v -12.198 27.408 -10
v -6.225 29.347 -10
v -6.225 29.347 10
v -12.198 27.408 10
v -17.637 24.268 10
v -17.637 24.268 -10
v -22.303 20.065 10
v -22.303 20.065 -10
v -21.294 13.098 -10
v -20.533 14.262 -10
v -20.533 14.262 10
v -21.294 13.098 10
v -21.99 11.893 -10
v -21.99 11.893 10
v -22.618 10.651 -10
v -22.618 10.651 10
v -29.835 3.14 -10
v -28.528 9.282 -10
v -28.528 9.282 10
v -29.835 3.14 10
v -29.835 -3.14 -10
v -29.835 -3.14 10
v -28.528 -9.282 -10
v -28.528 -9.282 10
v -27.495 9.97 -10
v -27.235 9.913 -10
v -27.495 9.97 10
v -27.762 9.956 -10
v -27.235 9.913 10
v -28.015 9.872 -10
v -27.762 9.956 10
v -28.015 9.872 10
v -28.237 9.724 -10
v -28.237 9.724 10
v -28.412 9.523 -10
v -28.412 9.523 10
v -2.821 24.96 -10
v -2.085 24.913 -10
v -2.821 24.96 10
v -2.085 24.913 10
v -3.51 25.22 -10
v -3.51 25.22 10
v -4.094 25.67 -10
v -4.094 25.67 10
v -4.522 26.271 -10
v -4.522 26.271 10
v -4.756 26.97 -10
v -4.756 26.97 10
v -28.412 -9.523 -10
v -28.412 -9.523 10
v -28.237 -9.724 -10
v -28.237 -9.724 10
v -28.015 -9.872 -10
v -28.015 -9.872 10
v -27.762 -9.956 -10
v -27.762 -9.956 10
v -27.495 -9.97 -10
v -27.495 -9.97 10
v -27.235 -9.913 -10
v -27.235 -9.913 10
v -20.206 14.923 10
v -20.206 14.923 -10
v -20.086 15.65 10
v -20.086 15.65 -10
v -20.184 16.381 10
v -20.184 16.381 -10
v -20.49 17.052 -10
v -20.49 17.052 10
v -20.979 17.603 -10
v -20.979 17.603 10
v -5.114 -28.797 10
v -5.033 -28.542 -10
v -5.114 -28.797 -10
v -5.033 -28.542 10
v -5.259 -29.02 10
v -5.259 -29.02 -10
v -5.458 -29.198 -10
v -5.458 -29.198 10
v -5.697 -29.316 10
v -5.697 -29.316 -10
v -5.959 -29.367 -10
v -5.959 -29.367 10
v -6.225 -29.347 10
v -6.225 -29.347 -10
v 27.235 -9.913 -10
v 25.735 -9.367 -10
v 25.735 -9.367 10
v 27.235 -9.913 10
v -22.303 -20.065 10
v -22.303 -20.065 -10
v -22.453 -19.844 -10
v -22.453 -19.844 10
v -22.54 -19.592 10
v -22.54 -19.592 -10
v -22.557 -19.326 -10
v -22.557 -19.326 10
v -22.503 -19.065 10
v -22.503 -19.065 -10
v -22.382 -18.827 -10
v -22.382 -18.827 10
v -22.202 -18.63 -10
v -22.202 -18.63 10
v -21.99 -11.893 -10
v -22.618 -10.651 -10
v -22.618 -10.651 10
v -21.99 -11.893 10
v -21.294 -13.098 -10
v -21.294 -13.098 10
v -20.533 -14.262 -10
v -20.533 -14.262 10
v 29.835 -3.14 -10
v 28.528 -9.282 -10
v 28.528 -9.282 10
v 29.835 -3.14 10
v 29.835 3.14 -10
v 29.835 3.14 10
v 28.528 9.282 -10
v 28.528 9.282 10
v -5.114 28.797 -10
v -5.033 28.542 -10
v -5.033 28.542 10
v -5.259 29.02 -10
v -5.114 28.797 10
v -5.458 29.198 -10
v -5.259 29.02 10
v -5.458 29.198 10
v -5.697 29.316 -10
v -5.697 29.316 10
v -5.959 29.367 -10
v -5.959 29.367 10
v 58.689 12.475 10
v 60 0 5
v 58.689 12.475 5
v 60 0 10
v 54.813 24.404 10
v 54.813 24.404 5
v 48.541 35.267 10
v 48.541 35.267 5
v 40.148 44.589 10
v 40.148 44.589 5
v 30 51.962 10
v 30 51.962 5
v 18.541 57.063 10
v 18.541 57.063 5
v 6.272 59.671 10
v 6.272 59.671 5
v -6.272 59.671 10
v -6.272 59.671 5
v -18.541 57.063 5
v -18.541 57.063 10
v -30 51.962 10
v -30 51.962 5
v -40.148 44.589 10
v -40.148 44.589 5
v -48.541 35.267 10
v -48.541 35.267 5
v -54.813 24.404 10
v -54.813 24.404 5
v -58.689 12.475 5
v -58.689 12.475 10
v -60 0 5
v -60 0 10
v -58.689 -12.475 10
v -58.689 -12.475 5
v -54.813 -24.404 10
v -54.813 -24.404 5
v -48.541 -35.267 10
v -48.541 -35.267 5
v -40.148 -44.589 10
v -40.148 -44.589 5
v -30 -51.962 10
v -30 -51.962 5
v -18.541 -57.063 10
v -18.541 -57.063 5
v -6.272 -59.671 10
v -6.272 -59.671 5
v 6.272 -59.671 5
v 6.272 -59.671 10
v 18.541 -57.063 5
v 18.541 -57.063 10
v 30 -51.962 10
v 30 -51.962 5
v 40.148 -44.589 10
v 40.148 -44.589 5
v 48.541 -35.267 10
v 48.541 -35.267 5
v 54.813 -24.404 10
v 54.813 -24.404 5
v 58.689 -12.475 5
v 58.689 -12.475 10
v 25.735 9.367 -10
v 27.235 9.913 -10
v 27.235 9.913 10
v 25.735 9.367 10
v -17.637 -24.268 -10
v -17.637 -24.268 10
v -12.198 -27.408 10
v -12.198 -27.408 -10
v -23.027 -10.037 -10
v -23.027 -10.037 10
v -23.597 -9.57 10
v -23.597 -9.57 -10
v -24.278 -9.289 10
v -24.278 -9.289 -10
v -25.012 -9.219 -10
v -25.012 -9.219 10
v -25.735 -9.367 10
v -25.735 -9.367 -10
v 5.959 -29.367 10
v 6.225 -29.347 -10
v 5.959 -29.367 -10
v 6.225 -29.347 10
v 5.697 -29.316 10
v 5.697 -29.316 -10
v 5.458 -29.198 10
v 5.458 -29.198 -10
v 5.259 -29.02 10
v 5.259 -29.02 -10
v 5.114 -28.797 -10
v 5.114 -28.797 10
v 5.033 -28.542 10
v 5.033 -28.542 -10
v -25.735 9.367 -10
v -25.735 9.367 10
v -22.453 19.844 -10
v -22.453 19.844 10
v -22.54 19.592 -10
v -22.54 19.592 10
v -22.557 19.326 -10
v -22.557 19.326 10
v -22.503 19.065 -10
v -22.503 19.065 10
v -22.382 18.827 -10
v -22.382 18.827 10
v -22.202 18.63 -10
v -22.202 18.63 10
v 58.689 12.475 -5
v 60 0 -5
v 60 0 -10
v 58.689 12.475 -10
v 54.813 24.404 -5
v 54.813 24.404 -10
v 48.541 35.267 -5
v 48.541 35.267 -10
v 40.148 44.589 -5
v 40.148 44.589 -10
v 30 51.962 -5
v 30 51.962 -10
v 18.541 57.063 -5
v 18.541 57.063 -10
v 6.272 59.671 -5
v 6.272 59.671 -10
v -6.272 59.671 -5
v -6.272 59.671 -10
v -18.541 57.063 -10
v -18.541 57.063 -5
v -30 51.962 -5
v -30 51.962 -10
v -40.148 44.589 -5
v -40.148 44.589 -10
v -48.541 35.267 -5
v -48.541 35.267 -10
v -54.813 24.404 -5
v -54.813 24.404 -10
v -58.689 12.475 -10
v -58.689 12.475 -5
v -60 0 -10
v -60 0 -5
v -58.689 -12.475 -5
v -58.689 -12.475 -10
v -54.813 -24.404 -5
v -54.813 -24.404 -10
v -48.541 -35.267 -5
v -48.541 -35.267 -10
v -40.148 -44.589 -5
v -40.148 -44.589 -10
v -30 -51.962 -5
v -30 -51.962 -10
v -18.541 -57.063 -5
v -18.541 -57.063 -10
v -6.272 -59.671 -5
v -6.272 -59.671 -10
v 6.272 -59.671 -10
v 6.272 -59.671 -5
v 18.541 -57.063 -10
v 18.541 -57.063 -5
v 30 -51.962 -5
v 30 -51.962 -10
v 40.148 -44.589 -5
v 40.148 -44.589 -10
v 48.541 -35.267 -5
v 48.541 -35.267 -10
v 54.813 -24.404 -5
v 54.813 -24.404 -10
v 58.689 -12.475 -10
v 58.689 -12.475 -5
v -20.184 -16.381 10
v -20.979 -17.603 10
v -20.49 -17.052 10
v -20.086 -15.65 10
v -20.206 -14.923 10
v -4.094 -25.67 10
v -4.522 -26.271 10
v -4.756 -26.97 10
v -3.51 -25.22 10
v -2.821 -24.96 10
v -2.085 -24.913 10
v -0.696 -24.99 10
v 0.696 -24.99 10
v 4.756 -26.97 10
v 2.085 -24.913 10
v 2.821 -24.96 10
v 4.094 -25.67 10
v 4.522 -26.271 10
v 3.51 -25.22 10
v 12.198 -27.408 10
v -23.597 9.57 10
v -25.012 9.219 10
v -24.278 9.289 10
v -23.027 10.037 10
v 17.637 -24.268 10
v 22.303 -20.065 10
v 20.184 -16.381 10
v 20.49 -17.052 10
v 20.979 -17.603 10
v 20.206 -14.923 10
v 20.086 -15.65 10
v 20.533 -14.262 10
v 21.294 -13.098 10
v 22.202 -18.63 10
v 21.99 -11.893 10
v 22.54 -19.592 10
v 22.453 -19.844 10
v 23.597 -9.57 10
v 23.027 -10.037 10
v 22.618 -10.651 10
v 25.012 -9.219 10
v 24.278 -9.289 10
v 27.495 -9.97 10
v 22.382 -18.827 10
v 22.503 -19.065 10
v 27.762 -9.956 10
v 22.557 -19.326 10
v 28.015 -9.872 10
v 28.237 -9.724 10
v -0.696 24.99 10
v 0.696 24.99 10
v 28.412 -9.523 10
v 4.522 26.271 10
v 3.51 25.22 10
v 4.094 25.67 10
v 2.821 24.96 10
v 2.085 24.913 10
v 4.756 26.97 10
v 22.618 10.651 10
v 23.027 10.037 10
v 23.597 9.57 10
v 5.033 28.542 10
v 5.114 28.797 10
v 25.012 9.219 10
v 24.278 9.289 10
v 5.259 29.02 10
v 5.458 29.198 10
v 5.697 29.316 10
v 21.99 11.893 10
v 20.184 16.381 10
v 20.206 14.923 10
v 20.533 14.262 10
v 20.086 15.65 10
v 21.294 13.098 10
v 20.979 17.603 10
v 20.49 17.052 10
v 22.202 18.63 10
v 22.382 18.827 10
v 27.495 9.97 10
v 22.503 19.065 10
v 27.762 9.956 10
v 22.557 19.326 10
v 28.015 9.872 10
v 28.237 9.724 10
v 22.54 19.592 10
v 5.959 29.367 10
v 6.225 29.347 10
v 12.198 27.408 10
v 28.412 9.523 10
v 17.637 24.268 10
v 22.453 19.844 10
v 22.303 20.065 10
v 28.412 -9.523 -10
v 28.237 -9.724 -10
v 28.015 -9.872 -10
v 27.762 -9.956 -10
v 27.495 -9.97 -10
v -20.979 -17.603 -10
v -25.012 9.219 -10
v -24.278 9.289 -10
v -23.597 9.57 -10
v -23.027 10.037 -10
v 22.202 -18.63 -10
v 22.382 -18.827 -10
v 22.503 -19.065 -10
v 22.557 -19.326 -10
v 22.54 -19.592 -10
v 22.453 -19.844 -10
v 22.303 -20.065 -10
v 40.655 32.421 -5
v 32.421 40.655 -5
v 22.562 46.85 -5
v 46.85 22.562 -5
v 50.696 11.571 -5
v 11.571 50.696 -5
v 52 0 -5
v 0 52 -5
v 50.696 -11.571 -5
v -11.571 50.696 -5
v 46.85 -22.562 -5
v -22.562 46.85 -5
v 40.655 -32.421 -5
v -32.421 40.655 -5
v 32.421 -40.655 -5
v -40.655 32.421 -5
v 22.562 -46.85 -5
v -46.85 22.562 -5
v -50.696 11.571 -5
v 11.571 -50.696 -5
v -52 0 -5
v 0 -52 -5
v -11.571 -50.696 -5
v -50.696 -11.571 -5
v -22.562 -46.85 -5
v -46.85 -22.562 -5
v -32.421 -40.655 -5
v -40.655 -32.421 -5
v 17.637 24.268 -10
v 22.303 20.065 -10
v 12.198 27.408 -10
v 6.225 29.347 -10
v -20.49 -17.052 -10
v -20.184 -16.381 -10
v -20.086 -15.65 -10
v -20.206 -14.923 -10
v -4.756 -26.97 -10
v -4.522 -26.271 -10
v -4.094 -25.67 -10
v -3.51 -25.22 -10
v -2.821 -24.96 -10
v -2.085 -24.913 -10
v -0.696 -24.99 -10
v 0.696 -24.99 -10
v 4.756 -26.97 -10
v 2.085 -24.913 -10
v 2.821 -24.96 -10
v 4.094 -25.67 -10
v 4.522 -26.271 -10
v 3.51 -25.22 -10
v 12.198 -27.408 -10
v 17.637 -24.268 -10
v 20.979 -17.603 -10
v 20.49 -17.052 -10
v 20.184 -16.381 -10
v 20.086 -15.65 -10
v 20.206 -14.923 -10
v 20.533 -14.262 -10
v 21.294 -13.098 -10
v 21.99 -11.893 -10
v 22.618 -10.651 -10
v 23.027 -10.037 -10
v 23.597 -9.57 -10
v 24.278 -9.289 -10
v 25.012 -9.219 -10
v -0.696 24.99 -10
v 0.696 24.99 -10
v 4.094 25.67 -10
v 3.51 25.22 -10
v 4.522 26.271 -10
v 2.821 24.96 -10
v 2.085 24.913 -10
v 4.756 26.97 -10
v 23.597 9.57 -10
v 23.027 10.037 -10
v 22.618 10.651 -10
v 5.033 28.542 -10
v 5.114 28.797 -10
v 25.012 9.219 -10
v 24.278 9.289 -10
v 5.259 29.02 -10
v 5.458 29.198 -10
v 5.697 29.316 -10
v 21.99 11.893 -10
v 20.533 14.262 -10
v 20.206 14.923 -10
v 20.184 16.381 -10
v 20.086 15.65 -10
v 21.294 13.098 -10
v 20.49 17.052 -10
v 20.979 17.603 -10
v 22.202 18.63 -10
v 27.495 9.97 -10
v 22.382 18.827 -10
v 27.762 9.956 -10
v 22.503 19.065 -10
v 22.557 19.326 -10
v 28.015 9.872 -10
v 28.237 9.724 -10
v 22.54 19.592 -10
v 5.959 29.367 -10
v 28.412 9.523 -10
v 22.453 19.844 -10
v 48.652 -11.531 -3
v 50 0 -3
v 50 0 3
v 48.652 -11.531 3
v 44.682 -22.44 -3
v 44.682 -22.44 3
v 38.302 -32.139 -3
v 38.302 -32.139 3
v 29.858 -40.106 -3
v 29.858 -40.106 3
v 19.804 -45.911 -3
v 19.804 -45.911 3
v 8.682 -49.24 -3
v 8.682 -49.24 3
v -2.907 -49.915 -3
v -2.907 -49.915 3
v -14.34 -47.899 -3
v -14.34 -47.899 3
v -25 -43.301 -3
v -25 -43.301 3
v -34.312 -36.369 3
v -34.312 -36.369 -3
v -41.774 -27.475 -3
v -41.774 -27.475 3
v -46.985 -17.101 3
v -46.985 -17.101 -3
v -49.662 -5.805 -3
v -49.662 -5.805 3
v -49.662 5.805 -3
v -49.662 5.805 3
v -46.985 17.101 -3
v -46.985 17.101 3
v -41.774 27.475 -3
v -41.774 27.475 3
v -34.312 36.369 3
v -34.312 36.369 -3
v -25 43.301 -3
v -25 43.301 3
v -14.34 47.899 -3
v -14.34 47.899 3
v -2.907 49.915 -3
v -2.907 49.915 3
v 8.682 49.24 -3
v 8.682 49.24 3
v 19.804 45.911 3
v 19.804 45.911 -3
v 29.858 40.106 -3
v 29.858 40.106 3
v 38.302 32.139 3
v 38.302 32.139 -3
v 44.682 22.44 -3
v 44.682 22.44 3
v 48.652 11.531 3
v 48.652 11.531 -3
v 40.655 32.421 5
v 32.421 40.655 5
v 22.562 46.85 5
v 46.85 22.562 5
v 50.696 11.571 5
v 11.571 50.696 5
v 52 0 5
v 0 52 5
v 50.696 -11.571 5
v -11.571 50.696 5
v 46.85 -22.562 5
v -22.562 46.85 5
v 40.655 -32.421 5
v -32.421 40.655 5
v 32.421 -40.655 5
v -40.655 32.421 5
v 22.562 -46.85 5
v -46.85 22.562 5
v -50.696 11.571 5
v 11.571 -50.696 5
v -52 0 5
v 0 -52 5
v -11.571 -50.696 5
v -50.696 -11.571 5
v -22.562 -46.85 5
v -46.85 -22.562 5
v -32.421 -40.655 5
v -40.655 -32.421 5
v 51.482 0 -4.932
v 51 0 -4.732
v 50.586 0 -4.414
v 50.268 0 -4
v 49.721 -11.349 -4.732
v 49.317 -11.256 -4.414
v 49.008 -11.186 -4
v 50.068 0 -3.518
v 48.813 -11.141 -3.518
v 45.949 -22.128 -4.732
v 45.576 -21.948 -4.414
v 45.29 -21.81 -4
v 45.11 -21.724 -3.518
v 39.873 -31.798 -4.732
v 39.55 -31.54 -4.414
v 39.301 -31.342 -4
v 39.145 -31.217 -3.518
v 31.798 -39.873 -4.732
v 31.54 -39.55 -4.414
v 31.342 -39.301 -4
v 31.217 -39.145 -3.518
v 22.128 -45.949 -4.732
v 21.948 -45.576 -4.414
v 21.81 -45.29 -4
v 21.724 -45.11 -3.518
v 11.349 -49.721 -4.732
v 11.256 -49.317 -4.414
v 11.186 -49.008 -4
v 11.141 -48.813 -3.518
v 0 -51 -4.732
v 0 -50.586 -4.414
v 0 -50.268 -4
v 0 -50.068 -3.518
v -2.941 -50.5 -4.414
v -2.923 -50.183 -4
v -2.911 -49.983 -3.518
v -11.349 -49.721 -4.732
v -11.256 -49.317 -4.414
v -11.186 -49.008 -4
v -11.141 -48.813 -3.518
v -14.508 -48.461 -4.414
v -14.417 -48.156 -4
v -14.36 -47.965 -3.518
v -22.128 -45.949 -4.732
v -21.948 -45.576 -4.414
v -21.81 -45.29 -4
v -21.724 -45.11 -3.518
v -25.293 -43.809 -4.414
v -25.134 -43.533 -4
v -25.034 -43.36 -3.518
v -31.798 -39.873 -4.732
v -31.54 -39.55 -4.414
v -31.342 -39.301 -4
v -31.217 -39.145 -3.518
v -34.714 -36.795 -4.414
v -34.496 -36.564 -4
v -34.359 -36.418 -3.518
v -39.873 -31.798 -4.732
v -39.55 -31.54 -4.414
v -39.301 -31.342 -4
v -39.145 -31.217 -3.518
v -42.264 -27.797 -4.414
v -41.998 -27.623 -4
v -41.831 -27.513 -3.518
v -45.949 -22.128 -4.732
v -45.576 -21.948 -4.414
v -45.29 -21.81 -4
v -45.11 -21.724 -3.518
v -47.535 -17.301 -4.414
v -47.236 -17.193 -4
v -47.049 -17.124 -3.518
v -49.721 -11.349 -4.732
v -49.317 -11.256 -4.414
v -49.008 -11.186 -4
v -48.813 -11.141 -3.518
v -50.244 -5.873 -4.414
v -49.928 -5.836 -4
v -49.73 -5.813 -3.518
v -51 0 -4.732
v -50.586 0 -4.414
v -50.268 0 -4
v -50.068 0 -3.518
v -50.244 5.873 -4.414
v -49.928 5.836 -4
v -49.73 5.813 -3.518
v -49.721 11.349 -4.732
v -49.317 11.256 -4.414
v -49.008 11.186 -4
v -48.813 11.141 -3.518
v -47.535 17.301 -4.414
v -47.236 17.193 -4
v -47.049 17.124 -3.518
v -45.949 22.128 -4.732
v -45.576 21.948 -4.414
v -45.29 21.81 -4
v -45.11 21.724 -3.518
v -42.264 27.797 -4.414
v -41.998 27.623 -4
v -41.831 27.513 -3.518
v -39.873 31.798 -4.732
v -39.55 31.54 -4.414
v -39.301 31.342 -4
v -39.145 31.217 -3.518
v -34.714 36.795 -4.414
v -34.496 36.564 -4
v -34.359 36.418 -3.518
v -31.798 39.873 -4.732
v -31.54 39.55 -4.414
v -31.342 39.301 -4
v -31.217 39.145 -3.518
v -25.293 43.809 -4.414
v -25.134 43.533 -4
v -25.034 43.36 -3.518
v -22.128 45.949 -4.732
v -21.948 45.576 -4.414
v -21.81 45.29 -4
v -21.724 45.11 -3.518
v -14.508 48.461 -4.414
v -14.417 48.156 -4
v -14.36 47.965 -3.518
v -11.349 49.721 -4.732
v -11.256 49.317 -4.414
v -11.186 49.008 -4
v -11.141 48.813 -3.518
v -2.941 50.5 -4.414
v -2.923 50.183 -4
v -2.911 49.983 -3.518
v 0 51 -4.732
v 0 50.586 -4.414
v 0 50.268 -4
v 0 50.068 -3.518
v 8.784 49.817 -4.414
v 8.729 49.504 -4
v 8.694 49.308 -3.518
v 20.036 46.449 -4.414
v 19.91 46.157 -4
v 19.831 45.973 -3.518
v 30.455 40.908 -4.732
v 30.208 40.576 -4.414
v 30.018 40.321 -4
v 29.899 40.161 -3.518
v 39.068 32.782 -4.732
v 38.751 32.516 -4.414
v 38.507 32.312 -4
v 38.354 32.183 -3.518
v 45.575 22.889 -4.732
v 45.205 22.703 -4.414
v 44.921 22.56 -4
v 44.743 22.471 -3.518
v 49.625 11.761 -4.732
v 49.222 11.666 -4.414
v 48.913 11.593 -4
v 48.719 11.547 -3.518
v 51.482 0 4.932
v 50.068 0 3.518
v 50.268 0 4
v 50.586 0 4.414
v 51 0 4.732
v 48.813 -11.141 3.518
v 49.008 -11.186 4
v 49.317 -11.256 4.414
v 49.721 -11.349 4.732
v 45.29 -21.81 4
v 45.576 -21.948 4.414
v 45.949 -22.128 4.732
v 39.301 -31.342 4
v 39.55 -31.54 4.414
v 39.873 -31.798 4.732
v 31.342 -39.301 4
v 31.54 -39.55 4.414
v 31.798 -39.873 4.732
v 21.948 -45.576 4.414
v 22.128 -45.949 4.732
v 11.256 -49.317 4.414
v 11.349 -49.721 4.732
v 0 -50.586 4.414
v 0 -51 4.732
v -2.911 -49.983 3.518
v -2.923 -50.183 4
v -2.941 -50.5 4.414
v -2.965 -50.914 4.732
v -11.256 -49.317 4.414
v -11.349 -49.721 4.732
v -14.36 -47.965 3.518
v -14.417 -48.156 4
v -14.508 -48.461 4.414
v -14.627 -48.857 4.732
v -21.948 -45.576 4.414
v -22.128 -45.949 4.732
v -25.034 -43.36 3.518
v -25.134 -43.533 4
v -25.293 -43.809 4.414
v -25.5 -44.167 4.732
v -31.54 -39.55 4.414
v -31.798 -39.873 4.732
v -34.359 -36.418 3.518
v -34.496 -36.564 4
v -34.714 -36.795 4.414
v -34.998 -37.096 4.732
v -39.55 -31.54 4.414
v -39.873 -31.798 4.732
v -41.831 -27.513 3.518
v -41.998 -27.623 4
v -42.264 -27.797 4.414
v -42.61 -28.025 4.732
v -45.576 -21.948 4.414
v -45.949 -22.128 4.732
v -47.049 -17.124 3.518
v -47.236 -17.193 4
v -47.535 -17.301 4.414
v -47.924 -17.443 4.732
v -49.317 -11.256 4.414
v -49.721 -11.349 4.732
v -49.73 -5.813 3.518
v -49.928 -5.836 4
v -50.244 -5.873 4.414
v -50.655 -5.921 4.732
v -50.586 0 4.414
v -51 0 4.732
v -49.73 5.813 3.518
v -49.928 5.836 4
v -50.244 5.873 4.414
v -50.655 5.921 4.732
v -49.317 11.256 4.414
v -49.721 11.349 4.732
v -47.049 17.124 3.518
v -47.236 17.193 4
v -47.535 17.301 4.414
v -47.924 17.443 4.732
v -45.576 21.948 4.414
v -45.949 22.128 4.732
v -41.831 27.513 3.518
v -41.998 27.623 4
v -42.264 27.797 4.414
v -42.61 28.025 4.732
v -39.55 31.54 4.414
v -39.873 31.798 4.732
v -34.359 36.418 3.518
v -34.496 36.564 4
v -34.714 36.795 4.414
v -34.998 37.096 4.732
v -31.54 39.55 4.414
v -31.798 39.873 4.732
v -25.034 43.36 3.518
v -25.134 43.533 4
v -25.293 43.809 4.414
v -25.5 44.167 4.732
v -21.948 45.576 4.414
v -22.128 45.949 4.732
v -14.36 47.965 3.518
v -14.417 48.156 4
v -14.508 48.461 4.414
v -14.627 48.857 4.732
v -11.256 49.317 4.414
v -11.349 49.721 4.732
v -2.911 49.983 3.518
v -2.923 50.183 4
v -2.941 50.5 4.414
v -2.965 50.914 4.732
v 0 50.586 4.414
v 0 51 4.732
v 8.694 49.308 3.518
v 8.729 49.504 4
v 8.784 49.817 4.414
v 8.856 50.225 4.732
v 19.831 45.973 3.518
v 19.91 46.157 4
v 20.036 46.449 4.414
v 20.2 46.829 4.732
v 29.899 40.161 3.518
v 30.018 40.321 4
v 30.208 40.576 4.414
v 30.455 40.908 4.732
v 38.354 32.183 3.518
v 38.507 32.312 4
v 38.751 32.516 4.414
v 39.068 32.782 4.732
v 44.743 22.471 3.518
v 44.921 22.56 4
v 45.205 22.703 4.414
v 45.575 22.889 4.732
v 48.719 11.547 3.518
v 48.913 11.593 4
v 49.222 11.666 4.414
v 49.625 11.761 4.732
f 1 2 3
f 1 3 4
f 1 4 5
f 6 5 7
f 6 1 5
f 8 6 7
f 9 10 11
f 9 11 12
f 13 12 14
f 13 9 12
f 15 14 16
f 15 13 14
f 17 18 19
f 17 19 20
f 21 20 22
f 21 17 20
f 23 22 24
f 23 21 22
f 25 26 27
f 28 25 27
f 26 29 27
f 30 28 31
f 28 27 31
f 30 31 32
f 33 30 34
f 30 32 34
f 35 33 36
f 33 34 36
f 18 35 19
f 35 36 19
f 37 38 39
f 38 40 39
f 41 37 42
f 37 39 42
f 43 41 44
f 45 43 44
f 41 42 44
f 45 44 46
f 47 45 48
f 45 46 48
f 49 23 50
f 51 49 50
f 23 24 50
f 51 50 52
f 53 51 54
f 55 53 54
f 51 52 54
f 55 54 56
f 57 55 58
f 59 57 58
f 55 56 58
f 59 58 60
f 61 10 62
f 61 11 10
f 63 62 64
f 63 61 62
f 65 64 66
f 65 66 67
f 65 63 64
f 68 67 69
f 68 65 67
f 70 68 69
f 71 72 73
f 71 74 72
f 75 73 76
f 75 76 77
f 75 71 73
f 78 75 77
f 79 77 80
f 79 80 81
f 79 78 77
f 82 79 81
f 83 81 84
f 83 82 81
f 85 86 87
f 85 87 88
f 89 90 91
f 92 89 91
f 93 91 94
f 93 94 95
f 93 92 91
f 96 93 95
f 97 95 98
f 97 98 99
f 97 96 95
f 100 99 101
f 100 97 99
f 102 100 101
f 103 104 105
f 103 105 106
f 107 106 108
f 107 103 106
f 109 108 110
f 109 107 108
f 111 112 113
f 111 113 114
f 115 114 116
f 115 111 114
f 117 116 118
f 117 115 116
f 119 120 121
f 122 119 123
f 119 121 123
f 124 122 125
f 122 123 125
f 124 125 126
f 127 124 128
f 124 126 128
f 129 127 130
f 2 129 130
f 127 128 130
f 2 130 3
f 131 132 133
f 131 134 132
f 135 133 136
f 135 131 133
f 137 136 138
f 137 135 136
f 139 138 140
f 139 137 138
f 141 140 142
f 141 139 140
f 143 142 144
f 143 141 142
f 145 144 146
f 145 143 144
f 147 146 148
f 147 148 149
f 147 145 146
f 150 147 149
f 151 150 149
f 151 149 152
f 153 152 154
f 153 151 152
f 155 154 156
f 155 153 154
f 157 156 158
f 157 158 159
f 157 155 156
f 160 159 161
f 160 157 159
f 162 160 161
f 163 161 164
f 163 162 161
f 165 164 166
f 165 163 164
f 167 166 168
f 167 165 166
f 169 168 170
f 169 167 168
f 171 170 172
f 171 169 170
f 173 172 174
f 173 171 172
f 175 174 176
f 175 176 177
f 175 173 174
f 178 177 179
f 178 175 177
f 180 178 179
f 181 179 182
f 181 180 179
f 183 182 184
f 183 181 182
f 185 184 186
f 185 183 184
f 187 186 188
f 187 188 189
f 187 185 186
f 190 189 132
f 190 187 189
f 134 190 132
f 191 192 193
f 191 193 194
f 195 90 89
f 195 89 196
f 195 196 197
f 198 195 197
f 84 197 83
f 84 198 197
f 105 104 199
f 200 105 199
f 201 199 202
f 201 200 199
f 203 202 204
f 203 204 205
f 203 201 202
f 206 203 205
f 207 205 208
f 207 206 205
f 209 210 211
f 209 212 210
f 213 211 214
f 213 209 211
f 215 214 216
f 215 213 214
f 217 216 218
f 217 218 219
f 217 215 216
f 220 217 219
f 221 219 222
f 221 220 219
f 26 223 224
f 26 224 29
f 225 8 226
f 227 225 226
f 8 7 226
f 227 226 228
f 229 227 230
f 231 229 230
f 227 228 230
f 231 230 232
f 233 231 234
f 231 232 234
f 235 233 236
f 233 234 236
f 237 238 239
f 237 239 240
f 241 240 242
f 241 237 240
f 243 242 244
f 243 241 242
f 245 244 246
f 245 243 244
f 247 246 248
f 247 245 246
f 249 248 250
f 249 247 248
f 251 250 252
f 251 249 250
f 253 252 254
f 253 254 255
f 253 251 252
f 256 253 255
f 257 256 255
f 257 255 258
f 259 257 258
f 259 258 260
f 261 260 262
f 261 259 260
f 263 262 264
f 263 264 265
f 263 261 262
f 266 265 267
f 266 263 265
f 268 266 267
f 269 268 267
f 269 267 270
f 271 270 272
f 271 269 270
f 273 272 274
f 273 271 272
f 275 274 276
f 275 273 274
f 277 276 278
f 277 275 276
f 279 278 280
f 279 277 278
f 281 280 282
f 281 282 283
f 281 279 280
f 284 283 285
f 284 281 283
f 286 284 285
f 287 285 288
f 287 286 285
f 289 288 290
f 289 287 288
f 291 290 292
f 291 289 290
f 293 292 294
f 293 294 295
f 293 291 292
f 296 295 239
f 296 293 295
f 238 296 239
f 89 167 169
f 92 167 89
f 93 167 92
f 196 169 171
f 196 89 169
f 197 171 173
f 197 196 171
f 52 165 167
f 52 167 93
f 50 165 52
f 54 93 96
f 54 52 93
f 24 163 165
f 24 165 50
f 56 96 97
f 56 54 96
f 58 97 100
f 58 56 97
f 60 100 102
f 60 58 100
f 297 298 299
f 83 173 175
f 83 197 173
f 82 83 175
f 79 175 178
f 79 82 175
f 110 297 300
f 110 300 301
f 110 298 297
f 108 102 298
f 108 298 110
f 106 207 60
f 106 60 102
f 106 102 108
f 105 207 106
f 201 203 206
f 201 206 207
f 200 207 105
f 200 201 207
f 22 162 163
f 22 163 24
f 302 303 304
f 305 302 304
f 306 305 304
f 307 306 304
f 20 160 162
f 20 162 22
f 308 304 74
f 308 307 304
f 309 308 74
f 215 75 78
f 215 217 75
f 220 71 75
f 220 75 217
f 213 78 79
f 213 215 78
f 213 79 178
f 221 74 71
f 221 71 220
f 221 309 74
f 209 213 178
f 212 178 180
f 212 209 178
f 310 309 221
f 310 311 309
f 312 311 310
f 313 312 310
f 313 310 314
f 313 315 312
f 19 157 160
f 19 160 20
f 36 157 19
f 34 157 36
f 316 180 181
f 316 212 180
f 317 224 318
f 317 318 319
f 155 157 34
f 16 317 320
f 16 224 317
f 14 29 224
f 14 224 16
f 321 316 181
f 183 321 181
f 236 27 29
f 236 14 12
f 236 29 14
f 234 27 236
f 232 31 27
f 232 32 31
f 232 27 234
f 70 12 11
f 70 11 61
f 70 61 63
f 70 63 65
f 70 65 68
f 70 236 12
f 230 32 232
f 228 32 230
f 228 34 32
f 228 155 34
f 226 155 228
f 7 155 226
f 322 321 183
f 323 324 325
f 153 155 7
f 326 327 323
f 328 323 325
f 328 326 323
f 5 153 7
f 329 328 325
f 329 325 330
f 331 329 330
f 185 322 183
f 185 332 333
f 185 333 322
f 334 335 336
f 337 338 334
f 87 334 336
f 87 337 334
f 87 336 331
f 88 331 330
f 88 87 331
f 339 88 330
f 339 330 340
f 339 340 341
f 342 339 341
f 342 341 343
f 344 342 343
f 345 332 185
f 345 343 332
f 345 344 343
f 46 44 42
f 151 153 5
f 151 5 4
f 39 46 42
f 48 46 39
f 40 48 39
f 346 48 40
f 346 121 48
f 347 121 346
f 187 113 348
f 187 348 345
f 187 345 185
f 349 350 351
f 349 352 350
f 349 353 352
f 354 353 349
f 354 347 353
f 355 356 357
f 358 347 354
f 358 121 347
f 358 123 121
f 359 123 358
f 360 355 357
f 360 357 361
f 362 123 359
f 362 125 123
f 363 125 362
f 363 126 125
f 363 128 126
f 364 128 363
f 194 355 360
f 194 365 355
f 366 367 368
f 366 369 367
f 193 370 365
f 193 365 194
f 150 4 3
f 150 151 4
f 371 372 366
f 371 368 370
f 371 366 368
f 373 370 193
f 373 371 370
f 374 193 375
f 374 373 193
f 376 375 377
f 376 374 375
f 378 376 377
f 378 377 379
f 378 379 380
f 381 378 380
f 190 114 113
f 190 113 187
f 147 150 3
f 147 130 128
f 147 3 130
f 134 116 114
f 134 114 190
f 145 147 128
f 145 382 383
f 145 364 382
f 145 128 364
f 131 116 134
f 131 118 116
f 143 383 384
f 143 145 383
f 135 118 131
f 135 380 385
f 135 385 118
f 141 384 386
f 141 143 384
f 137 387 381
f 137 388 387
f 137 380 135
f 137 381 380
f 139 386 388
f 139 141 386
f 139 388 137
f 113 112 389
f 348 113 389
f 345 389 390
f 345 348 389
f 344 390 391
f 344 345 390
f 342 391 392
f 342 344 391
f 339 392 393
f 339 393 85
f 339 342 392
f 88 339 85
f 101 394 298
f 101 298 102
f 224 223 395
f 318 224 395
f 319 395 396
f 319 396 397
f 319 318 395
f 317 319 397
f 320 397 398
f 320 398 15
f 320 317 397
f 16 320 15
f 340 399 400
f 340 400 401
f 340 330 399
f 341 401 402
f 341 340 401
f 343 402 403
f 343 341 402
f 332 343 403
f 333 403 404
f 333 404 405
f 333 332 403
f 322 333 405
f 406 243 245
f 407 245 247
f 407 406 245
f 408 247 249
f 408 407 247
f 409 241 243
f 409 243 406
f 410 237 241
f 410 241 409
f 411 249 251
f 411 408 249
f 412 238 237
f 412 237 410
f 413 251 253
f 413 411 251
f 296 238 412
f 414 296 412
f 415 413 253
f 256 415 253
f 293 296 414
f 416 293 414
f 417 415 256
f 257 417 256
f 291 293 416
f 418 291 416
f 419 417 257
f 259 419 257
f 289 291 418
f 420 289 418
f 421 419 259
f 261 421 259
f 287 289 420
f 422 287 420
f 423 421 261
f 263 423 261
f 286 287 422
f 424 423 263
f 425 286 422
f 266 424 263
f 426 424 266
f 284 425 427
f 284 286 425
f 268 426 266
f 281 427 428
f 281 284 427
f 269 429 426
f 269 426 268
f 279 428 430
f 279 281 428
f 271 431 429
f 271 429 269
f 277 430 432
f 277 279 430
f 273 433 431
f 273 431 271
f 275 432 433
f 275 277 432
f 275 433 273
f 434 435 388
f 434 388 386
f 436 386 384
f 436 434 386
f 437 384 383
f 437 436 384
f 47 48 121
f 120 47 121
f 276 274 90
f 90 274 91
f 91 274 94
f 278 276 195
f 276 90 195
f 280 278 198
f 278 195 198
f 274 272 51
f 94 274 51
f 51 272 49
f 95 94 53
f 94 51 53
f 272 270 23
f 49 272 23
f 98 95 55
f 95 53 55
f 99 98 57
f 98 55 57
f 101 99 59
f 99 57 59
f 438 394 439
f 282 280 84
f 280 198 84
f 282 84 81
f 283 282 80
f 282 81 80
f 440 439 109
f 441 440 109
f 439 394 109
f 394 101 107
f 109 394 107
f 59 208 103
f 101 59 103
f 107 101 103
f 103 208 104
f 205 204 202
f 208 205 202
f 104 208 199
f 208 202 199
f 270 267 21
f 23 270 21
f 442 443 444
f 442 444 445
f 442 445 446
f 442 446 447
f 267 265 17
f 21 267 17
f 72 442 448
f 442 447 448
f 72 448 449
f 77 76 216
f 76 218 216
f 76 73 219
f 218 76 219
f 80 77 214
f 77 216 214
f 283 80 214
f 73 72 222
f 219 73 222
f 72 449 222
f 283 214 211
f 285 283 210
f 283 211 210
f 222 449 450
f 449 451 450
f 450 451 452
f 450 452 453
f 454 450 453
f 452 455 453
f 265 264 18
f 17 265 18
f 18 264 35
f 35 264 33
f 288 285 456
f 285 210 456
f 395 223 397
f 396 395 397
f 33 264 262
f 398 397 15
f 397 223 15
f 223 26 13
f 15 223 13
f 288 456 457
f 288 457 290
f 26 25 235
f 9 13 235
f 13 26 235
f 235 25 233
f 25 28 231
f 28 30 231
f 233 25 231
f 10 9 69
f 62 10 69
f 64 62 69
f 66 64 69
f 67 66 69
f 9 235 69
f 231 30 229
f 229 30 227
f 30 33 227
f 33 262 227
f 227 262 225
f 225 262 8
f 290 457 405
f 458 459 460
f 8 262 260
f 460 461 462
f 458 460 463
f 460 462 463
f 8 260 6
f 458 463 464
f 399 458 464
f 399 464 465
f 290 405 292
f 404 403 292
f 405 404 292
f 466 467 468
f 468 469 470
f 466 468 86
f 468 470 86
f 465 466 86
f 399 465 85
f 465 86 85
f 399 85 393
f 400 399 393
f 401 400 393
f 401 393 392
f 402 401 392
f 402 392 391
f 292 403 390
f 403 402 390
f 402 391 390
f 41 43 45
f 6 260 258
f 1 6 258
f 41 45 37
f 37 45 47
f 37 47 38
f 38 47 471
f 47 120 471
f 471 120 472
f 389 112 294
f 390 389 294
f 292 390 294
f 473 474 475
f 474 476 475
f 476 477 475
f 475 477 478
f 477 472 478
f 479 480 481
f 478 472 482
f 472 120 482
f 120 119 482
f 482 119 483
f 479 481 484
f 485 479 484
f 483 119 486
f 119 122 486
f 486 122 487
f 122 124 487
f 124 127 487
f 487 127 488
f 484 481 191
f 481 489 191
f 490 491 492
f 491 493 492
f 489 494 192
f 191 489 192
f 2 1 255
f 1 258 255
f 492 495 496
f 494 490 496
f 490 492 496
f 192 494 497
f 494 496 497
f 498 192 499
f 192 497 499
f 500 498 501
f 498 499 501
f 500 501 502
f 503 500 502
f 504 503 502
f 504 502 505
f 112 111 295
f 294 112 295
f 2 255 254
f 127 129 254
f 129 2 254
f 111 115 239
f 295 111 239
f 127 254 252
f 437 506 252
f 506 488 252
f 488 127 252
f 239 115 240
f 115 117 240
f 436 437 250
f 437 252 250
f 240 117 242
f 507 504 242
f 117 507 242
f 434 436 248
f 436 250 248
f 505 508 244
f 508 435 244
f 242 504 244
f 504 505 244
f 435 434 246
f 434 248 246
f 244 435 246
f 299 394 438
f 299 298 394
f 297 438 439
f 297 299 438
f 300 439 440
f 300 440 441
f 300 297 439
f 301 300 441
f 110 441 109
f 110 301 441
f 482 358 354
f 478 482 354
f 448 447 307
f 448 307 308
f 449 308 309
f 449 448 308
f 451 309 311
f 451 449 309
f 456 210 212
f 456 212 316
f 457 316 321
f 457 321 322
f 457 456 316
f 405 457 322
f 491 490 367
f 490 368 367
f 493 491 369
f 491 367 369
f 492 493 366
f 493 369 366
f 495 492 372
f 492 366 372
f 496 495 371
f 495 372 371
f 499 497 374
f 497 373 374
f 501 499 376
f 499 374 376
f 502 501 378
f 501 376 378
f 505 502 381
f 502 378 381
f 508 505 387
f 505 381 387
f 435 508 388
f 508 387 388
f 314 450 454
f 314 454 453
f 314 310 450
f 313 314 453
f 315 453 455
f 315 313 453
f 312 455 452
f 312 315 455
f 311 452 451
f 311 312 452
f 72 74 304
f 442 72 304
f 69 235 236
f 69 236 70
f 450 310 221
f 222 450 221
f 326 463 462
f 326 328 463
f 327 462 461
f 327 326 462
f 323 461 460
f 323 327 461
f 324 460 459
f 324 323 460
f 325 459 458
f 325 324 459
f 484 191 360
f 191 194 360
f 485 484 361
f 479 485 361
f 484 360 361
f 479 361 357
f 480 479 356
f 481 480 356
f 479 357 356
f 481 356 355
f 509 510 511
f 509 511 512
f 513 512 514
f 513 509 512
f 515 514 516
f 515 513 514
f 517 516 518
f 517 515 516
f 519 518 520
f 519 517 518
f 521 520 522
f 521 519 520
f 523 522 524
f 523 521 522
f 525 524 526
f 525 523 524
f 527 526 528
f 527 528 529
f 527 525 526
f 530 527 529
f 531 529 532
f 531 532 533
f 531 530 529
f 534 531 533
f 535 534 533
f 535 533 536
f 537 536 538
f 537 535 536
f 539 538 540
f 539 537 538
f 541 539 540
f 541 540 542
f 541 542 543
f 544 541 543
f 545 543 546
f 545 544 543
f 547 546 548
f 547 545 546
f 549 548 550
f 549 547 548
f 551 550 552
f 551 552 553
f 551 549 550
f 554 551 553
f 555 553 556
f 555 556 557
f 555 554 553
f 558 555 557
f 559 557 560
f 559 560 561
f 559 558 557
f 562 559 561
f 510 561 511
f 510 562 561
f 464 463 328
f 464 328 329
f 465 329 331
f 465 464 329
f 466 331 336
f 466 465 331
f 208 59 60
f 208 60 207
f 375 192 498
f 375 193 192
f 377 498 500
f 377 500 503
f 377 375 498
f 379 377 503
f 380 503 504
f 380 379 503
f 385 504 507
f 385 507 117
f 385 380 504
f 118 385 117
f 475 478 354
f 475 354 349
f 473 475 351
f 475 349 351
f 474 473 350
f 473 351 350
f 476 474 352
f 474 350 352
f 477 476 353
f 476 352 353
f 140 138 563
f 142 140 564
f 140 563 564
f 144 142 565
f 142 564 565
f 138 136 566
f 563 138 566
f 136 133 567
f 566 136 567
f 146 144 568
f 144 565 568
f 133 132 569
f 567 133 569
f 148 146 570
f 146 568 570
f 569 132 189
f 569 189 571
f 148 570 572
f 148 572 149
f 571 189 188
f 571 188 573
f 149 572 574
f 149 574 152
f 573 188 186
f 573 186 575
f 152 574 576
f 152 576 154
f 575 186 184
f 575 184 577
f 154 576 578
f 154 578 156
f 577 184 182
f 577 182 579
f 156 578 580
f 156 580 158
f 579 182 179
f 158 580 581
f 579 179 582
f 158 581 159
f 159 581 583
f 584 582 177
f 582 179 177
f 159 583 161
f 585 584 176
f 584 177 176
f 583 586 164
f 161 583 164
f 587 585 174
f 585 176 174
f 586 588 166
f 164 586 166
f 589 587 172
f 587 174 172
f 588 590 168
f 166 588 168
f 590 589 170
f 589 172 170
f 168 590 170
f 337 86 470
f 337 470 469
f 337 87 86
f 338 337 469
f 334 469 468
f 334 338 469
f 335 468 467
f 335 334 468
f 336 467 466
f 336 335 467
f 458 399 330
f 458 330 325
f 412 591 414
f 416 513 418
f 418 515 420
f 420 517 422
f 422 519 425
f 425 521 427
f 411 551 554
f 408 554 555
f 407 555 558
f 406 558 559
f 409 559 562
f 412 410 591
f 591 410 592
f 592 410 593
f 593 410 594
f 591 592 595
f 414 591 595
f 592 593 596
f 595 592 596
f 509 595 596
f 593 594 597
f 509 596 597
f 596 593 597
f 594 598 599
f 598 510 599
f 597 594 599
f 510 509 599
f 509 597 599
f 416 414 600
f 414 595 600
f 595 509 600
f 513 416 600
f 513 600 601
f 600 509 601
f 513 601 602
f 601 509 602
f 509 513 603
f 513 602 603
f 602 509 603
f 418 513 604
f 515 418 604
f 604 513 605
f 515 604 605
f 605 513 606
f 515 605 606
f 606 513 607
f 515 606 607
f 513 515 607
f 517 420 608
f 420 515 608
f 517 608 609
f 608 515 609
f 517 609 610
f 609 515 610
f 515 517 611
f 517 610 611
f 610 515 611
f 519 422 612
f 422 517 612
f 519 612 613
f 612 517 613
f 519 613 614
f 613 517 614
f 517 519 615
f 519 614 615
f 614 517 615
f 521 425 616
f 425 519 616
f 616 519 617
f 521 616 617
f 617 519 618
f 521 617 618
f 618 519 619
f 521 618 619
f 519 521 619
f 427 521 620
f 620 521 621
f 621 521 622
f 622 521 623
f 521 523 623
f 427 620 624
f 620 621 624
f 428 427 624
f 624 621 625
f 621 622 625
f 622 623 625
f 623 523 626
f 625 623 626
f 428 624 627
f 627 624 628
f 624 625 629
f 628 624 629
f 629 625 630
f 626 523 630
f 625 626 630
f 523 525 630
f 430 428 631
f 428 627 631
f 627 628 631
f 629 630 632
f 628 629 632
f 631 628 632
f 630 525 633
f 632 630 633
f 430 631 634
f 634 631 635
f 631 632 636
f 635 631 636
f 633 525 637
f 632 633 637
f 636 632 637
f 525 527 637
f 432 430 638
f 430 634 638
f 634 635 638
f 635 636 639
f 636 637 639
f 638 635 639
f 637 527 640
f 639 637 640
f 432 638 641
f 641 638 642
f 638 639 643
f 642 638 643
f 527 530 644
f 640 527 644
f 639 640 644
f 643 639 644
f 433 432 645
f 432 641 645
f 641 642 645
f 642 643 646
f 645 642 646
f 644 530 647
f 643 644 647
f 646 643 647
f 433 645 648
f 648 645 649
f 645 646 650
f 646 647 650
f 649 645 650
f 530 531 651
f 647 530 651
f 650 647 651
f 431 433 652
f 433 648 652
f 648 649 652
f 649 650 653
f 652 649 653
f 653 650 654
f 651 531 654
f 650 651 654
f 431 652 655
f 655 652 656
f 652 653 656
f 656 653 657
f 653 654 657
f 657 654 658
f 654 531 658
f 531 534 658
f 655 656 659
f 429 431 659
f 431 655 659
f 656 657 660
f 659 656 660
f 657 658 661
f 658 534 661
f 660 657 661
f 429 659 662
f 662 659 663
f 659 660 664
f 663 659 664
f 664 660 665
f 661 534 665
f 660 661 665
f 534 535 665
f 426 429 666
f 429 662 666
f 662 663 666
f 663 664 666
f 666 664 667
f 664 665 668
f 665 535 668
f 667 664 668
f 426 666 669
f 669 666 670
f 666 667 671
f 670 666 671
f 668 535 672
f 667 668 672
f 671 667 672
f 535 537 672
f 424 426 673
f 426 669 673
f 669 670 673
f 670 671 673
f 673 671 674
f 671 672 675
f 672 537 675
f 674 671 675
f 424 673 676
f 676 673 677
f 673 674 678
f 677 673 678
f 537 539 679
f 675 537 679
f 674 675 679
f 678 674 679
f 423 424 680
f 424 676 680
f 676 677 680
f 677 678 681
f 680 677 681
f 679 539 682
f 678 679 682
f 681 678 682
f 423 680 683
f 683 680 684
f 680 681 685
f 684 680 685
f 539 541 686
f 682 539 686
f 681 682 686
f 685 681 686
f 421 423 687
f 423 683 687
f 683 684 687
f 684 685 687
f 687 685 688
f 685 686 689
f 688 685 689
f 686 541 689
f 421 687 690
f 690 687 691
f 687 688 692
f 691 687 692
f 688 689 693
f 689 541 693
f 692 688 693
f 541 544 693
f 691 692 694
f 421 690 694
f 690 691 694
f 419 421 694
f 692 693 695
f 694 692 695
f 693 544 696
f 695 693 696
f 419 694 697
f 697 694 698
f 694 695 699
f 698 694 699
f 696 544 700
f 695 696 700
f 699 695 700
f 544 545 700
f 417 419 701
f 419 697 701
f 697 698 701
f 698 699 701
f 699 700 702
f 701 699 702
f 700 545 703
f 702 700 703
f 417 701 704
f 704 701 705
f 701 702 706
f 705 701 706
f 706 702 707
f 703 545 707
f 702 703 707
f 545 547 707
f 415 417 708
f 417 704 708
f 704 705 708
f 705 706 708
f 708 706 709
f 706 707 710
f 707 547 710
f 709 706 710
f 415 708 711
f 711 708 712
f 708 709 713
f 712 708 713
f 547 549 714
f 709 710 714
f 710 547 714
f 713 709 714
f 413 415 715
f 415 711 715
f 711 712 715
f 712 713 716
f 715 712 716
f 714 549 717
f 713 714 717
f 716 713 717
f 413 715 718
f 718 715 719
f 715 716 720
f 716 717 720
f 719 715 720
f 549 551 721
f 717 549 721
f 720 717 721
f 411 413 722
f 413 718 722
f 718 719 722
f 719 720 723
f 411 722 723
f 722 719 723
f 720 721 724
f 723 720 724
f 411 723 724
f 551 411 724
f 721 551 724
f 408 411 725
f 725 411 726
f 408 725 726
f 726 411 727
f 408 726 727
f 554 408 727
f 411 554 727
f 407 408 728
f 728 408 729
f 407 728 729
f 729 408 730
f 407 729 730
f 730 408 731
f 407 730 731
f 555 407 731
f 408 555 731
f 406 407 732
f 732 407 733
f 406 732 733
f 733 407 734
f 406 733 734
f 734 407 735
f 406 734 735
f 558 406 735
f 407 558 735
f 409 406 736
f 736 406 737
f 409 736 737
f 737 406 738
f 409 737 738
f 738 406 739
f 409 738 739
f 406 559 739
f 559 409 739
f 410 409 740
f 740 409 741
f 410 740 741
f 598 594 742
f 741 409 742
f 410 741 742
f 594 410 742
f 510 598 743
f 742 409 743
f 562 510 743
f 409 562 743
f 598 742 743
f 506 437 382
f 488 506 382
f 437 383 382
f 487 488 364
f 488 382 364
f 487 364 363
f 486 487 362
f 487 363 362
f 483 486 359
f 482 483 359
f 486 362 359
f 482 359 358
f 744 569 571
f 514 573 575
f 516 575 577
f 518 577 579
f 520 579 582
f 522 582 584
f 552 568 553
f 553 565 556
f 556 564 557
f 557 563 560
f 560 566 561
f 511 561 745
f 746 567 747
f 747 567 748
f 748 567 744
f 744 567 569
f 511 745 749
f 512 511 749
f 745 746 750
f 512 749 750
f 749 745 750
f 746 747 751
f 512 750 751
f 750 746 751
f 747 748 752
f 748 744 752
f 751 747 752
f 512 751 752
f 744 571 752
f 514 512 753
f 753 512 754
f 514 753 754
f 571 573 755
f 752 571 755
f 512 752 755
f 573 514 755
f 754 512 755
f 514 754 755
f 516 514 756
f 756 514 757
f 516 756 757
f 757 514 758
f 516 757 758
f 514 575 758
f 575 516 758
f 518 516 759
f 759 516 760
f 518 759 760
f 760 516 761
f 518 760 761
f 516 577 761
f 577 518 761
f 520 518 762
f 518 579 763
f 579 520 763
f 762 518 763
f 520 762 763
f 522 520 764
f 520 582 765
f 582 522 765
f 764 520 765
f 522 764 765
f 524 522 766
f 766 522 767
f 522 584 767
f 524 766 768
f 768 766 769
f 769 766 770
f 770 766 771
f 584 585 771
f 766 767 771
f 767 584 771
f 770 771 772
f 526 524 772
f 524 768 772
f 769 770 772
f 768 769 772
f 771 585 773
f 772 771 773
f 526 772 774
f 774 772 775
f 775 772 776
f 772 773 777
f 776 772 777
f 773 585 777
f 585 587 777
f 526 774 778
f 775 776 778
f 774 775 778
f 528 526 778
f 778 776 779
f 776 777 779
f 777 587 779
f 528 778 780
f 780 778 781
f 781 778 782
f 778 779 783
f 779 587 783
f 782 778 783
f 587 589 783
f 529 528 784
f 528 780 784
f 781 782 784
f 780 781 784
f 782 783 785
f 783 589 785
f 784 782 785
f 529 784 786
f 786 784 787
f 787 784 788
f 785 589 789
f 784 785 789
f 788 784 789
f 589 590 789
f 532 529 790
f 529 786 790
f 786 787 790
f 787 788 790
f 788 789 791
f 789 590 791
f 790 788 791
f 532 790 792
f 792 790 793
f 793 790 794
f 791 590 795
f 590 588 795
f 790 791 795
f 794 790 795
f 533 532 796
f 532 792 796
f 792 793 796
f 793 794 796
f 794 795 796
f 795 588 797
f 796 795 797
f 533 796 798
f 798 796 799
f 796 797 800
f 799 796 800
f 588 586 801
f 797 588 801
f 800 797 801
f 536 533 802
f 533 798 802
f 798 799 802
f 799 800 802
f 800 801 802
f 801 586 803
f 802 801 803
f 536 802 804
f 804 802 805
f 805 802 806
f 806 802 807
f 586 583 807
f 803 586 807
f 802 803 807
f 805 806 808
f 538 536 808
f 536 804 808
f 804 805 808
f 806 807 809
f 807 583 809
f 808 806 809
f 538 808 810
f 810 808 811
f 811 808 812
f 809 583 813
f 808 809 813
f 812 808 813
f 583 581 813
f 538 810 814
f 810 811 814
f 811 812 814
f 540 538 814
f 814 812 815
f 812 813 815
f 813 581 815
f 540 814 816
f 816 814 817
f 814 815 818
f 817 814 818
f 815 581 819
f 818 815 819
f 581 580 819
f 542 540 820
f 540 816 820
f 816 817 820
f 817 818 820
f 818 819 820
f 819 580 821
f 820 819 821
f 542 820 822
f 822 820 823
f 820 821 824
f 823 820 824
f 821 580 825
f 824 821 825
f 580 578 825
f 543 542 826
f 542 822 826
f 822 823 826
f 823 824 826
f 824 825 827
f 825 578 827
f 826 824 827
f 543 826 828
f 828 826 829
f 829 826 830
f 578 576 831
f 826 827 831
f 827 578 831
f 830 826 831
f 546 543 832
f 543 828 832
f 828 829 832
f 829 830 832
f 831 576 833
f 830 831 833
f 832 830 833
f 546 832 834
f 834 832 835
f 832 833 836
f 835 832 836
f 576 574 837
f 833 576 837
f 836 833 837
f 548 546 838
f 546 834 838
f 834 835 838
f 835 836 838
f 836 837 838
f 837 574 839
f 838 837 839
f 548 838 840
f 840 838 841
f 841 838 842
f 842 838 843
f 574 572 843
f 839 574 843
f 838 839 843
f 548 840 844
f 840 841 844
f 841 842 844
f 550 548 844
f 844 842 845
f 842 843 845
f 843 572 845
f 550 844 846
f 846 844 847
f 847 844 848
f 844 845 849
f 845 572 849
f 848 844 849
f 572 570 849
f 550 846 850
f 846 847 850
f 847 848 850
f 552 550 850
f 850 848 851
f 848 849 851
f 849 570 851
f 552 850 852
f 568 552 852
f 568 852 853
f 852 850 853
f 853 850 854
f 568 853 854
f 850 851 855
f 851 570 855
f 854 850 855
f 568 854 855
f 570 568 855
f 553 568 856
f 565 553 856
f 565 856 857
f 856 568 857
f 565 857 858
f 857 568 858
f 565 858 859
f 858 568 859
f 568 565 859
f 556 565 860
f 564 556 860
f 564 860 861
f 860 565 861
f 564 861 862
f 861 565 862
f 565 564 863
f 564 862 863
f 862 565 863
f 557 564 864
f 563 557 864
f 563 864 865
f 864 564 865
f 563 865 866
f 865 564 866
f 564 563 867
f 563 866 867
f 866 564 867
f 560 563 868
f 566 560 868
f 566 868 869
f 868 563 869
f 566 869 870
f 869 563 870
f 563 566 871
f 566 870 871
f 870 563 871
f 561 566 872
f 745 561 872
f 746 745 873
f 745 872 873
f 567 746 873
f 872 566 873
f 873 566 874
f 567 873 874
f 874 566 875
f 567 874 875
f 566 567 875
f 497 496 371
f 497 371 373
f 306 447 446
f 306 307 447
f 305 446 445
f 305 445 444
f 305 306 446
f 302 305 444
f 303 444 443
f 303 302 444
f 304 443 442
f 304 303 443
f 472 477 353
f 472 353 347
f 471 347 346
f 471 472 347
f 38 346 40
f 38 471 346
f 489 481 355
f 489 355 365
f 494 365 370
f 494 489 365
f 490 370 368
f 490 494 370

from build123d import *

# Parameters (mm, degrees)
SKETCH1_R                = 60
SKETCH1_R_2              = 30
BOSS_EXTRUDE1_DEPTH      = 10
SKETCH2_W                = 10
SKETCH2_H                = 20
BOSS_EXTRUDE2_START      = -20
BOSS_EXTRUDE2_DEPTH      = 20
FILLET1_R                = 2.5
FILLET2_R                = 1
CIRPATTERN1_COUNT        = 6
FILLET1_OF_CIRPATTERN1_R = 2.5
FILLET2_OF_CIRPATTERN1_R = 1
FILLET3_R                = 2


with BuildPart() as part:
    # Sketch1 → Boss-Extrude1 (new, symmetric)
    with BuildSketch(Plane.XY):
        Circle(SKETCH1_R)
        Circle(SKETCH1_R_2, mode=Mode.SUBTRACT)
    extrude(amount=BOSS_EXTRUDE1_DEPTH, both=True)

    # Sketch2 → Cut-Revolve1 (revolve, cut)
    with BuildSketch(Plane(origin=(0, 0, 0), x_dir=(0, 0, -1), z_dir=(1, 0, 0)), mode=Mode.PRIVATE) as cut_revolve1_sk:
        with Locations((0, 60)):
            Rectangle(SKETCH2_W, SKETCH2_H)
    revolve(cut_revolve1_sk.sketch.rotate(Axis((0, 0, 1000), (0, 0, -1)), 90), axis=Axis((0, 0, 1000), (0, 0, -1)), mode=Mode.SUBTRACT)

    # Sketch3 → Boss-Extrude2 (add)
    with BuildSketch(Plane.XY.offset(10).offset(BOSS_EXTRUDE2_START)):
        with BuildLine():
            Line((5.20944533, 29.54423259), (4.341204442, 24.620193825))
            ThreePointArc((4.341204442, 24.620193825), (0, 25), (-4.341204442, 24.620193825))
            Line((-4.341204442, 24.620193825), (-5.20944533, 29.54423259))
            ThreePointArc((-5.20944533, 29.54423259), (0, 30), (5.20944533, 29.54423259))
        make_face()
    boss_extrude2 = extrude(amount=BOSS_EXTRUDE2_DEPTH)

    # Fillet1
    fillet1_edges = [part.edges().sort_by_distance(p)[0] for p in [
        (4.341204442, 24.620193825, 0),
        (-4.341204442, 24.620193825, 0),
    ]]
    fillet(fillet1_edges, radius=FILLET1_R)

    # Fillet2
    fillet2_edges = [part.edges().sort_by_distance(p)[0] for p in [
        (-5.20944533, 29.54423259, 0),
        (5.20944533, 29.54423259, 0),
    ]]
    fillet(fillet2_edges, radius=FILLET2_R)

    # CirPattern1: Boss-Extrude2 ×6 about axis
    cirpattern1_axis = Axis((0, 0, 0), (0, 0, 1))
    for i in range(1, CIRPATTERN1_COUNT):
        add(boss_extrude2.rotate(cirpattern1_axis, i * 360 / CIRPATTERN1_COUNT))

    # Fillet1 of CirPattern1
    fillet1_of_cirpattern1_edges = [part.edges().sort_by_distance(p)[0] for p in [
        (-19.151111078, 16.069690242, 0),
        (-23.49231552, 8.550503583, 0),
        (-23.49231552, -8.550503583, 0),
        (-19.151111078, -16.069690242, 0),
        (-4.341204442, -24.620193825, 0),
        (4.341204442, -24.620193825, 0),
        (19.151111078, -16.069690242, 0),
        (23.49231552, -8.550503583, 0),
        (23.49231552, 8.550503583, 0),
        (19.151111078, 16.069690242, 0),
    ]]
    fillet(fillet1_of_cirpattern1_edges, radius=FILLET1_OF_CIRPATTERN1_R)

    # Fillet2 of CirPattern1
    fillet2_of_cirpattern1_edges = [part.edges().sort_by_distance(p)[0] for p in [
        (-28.190778624, 10.2606043, 0),
        (-22.981333294, 19.283628291, 0),
        (-22.981333294, -19.283628291, 0),
        (-28.190778624, -10.2606043, 0),
        (5.20944533, -29.54423259, 0),
        (-5.20944533, -29.54423259, 0),
        (28.190778624, -10.2606043, 0),
        (22.981333294, -19.283628291, 0),
        (22.981333294, 19.283628291, 0),
        (28.190778624, 10.2606043, 0),
    ]]
    fillet(fillet2_of_cirpattern1_edges, radius=FILLET2_OF_CIRPATTERN1_R)

    # Fillet3
    fillet3_edges = [part.edges().sort_by_distance(p)[0] for p in [
        (-50, 0, -5),
        (-50, 0, 5),
    ]]
    fillet(fillet3_edges, radius=FILLET3_R)


solid = part.part
